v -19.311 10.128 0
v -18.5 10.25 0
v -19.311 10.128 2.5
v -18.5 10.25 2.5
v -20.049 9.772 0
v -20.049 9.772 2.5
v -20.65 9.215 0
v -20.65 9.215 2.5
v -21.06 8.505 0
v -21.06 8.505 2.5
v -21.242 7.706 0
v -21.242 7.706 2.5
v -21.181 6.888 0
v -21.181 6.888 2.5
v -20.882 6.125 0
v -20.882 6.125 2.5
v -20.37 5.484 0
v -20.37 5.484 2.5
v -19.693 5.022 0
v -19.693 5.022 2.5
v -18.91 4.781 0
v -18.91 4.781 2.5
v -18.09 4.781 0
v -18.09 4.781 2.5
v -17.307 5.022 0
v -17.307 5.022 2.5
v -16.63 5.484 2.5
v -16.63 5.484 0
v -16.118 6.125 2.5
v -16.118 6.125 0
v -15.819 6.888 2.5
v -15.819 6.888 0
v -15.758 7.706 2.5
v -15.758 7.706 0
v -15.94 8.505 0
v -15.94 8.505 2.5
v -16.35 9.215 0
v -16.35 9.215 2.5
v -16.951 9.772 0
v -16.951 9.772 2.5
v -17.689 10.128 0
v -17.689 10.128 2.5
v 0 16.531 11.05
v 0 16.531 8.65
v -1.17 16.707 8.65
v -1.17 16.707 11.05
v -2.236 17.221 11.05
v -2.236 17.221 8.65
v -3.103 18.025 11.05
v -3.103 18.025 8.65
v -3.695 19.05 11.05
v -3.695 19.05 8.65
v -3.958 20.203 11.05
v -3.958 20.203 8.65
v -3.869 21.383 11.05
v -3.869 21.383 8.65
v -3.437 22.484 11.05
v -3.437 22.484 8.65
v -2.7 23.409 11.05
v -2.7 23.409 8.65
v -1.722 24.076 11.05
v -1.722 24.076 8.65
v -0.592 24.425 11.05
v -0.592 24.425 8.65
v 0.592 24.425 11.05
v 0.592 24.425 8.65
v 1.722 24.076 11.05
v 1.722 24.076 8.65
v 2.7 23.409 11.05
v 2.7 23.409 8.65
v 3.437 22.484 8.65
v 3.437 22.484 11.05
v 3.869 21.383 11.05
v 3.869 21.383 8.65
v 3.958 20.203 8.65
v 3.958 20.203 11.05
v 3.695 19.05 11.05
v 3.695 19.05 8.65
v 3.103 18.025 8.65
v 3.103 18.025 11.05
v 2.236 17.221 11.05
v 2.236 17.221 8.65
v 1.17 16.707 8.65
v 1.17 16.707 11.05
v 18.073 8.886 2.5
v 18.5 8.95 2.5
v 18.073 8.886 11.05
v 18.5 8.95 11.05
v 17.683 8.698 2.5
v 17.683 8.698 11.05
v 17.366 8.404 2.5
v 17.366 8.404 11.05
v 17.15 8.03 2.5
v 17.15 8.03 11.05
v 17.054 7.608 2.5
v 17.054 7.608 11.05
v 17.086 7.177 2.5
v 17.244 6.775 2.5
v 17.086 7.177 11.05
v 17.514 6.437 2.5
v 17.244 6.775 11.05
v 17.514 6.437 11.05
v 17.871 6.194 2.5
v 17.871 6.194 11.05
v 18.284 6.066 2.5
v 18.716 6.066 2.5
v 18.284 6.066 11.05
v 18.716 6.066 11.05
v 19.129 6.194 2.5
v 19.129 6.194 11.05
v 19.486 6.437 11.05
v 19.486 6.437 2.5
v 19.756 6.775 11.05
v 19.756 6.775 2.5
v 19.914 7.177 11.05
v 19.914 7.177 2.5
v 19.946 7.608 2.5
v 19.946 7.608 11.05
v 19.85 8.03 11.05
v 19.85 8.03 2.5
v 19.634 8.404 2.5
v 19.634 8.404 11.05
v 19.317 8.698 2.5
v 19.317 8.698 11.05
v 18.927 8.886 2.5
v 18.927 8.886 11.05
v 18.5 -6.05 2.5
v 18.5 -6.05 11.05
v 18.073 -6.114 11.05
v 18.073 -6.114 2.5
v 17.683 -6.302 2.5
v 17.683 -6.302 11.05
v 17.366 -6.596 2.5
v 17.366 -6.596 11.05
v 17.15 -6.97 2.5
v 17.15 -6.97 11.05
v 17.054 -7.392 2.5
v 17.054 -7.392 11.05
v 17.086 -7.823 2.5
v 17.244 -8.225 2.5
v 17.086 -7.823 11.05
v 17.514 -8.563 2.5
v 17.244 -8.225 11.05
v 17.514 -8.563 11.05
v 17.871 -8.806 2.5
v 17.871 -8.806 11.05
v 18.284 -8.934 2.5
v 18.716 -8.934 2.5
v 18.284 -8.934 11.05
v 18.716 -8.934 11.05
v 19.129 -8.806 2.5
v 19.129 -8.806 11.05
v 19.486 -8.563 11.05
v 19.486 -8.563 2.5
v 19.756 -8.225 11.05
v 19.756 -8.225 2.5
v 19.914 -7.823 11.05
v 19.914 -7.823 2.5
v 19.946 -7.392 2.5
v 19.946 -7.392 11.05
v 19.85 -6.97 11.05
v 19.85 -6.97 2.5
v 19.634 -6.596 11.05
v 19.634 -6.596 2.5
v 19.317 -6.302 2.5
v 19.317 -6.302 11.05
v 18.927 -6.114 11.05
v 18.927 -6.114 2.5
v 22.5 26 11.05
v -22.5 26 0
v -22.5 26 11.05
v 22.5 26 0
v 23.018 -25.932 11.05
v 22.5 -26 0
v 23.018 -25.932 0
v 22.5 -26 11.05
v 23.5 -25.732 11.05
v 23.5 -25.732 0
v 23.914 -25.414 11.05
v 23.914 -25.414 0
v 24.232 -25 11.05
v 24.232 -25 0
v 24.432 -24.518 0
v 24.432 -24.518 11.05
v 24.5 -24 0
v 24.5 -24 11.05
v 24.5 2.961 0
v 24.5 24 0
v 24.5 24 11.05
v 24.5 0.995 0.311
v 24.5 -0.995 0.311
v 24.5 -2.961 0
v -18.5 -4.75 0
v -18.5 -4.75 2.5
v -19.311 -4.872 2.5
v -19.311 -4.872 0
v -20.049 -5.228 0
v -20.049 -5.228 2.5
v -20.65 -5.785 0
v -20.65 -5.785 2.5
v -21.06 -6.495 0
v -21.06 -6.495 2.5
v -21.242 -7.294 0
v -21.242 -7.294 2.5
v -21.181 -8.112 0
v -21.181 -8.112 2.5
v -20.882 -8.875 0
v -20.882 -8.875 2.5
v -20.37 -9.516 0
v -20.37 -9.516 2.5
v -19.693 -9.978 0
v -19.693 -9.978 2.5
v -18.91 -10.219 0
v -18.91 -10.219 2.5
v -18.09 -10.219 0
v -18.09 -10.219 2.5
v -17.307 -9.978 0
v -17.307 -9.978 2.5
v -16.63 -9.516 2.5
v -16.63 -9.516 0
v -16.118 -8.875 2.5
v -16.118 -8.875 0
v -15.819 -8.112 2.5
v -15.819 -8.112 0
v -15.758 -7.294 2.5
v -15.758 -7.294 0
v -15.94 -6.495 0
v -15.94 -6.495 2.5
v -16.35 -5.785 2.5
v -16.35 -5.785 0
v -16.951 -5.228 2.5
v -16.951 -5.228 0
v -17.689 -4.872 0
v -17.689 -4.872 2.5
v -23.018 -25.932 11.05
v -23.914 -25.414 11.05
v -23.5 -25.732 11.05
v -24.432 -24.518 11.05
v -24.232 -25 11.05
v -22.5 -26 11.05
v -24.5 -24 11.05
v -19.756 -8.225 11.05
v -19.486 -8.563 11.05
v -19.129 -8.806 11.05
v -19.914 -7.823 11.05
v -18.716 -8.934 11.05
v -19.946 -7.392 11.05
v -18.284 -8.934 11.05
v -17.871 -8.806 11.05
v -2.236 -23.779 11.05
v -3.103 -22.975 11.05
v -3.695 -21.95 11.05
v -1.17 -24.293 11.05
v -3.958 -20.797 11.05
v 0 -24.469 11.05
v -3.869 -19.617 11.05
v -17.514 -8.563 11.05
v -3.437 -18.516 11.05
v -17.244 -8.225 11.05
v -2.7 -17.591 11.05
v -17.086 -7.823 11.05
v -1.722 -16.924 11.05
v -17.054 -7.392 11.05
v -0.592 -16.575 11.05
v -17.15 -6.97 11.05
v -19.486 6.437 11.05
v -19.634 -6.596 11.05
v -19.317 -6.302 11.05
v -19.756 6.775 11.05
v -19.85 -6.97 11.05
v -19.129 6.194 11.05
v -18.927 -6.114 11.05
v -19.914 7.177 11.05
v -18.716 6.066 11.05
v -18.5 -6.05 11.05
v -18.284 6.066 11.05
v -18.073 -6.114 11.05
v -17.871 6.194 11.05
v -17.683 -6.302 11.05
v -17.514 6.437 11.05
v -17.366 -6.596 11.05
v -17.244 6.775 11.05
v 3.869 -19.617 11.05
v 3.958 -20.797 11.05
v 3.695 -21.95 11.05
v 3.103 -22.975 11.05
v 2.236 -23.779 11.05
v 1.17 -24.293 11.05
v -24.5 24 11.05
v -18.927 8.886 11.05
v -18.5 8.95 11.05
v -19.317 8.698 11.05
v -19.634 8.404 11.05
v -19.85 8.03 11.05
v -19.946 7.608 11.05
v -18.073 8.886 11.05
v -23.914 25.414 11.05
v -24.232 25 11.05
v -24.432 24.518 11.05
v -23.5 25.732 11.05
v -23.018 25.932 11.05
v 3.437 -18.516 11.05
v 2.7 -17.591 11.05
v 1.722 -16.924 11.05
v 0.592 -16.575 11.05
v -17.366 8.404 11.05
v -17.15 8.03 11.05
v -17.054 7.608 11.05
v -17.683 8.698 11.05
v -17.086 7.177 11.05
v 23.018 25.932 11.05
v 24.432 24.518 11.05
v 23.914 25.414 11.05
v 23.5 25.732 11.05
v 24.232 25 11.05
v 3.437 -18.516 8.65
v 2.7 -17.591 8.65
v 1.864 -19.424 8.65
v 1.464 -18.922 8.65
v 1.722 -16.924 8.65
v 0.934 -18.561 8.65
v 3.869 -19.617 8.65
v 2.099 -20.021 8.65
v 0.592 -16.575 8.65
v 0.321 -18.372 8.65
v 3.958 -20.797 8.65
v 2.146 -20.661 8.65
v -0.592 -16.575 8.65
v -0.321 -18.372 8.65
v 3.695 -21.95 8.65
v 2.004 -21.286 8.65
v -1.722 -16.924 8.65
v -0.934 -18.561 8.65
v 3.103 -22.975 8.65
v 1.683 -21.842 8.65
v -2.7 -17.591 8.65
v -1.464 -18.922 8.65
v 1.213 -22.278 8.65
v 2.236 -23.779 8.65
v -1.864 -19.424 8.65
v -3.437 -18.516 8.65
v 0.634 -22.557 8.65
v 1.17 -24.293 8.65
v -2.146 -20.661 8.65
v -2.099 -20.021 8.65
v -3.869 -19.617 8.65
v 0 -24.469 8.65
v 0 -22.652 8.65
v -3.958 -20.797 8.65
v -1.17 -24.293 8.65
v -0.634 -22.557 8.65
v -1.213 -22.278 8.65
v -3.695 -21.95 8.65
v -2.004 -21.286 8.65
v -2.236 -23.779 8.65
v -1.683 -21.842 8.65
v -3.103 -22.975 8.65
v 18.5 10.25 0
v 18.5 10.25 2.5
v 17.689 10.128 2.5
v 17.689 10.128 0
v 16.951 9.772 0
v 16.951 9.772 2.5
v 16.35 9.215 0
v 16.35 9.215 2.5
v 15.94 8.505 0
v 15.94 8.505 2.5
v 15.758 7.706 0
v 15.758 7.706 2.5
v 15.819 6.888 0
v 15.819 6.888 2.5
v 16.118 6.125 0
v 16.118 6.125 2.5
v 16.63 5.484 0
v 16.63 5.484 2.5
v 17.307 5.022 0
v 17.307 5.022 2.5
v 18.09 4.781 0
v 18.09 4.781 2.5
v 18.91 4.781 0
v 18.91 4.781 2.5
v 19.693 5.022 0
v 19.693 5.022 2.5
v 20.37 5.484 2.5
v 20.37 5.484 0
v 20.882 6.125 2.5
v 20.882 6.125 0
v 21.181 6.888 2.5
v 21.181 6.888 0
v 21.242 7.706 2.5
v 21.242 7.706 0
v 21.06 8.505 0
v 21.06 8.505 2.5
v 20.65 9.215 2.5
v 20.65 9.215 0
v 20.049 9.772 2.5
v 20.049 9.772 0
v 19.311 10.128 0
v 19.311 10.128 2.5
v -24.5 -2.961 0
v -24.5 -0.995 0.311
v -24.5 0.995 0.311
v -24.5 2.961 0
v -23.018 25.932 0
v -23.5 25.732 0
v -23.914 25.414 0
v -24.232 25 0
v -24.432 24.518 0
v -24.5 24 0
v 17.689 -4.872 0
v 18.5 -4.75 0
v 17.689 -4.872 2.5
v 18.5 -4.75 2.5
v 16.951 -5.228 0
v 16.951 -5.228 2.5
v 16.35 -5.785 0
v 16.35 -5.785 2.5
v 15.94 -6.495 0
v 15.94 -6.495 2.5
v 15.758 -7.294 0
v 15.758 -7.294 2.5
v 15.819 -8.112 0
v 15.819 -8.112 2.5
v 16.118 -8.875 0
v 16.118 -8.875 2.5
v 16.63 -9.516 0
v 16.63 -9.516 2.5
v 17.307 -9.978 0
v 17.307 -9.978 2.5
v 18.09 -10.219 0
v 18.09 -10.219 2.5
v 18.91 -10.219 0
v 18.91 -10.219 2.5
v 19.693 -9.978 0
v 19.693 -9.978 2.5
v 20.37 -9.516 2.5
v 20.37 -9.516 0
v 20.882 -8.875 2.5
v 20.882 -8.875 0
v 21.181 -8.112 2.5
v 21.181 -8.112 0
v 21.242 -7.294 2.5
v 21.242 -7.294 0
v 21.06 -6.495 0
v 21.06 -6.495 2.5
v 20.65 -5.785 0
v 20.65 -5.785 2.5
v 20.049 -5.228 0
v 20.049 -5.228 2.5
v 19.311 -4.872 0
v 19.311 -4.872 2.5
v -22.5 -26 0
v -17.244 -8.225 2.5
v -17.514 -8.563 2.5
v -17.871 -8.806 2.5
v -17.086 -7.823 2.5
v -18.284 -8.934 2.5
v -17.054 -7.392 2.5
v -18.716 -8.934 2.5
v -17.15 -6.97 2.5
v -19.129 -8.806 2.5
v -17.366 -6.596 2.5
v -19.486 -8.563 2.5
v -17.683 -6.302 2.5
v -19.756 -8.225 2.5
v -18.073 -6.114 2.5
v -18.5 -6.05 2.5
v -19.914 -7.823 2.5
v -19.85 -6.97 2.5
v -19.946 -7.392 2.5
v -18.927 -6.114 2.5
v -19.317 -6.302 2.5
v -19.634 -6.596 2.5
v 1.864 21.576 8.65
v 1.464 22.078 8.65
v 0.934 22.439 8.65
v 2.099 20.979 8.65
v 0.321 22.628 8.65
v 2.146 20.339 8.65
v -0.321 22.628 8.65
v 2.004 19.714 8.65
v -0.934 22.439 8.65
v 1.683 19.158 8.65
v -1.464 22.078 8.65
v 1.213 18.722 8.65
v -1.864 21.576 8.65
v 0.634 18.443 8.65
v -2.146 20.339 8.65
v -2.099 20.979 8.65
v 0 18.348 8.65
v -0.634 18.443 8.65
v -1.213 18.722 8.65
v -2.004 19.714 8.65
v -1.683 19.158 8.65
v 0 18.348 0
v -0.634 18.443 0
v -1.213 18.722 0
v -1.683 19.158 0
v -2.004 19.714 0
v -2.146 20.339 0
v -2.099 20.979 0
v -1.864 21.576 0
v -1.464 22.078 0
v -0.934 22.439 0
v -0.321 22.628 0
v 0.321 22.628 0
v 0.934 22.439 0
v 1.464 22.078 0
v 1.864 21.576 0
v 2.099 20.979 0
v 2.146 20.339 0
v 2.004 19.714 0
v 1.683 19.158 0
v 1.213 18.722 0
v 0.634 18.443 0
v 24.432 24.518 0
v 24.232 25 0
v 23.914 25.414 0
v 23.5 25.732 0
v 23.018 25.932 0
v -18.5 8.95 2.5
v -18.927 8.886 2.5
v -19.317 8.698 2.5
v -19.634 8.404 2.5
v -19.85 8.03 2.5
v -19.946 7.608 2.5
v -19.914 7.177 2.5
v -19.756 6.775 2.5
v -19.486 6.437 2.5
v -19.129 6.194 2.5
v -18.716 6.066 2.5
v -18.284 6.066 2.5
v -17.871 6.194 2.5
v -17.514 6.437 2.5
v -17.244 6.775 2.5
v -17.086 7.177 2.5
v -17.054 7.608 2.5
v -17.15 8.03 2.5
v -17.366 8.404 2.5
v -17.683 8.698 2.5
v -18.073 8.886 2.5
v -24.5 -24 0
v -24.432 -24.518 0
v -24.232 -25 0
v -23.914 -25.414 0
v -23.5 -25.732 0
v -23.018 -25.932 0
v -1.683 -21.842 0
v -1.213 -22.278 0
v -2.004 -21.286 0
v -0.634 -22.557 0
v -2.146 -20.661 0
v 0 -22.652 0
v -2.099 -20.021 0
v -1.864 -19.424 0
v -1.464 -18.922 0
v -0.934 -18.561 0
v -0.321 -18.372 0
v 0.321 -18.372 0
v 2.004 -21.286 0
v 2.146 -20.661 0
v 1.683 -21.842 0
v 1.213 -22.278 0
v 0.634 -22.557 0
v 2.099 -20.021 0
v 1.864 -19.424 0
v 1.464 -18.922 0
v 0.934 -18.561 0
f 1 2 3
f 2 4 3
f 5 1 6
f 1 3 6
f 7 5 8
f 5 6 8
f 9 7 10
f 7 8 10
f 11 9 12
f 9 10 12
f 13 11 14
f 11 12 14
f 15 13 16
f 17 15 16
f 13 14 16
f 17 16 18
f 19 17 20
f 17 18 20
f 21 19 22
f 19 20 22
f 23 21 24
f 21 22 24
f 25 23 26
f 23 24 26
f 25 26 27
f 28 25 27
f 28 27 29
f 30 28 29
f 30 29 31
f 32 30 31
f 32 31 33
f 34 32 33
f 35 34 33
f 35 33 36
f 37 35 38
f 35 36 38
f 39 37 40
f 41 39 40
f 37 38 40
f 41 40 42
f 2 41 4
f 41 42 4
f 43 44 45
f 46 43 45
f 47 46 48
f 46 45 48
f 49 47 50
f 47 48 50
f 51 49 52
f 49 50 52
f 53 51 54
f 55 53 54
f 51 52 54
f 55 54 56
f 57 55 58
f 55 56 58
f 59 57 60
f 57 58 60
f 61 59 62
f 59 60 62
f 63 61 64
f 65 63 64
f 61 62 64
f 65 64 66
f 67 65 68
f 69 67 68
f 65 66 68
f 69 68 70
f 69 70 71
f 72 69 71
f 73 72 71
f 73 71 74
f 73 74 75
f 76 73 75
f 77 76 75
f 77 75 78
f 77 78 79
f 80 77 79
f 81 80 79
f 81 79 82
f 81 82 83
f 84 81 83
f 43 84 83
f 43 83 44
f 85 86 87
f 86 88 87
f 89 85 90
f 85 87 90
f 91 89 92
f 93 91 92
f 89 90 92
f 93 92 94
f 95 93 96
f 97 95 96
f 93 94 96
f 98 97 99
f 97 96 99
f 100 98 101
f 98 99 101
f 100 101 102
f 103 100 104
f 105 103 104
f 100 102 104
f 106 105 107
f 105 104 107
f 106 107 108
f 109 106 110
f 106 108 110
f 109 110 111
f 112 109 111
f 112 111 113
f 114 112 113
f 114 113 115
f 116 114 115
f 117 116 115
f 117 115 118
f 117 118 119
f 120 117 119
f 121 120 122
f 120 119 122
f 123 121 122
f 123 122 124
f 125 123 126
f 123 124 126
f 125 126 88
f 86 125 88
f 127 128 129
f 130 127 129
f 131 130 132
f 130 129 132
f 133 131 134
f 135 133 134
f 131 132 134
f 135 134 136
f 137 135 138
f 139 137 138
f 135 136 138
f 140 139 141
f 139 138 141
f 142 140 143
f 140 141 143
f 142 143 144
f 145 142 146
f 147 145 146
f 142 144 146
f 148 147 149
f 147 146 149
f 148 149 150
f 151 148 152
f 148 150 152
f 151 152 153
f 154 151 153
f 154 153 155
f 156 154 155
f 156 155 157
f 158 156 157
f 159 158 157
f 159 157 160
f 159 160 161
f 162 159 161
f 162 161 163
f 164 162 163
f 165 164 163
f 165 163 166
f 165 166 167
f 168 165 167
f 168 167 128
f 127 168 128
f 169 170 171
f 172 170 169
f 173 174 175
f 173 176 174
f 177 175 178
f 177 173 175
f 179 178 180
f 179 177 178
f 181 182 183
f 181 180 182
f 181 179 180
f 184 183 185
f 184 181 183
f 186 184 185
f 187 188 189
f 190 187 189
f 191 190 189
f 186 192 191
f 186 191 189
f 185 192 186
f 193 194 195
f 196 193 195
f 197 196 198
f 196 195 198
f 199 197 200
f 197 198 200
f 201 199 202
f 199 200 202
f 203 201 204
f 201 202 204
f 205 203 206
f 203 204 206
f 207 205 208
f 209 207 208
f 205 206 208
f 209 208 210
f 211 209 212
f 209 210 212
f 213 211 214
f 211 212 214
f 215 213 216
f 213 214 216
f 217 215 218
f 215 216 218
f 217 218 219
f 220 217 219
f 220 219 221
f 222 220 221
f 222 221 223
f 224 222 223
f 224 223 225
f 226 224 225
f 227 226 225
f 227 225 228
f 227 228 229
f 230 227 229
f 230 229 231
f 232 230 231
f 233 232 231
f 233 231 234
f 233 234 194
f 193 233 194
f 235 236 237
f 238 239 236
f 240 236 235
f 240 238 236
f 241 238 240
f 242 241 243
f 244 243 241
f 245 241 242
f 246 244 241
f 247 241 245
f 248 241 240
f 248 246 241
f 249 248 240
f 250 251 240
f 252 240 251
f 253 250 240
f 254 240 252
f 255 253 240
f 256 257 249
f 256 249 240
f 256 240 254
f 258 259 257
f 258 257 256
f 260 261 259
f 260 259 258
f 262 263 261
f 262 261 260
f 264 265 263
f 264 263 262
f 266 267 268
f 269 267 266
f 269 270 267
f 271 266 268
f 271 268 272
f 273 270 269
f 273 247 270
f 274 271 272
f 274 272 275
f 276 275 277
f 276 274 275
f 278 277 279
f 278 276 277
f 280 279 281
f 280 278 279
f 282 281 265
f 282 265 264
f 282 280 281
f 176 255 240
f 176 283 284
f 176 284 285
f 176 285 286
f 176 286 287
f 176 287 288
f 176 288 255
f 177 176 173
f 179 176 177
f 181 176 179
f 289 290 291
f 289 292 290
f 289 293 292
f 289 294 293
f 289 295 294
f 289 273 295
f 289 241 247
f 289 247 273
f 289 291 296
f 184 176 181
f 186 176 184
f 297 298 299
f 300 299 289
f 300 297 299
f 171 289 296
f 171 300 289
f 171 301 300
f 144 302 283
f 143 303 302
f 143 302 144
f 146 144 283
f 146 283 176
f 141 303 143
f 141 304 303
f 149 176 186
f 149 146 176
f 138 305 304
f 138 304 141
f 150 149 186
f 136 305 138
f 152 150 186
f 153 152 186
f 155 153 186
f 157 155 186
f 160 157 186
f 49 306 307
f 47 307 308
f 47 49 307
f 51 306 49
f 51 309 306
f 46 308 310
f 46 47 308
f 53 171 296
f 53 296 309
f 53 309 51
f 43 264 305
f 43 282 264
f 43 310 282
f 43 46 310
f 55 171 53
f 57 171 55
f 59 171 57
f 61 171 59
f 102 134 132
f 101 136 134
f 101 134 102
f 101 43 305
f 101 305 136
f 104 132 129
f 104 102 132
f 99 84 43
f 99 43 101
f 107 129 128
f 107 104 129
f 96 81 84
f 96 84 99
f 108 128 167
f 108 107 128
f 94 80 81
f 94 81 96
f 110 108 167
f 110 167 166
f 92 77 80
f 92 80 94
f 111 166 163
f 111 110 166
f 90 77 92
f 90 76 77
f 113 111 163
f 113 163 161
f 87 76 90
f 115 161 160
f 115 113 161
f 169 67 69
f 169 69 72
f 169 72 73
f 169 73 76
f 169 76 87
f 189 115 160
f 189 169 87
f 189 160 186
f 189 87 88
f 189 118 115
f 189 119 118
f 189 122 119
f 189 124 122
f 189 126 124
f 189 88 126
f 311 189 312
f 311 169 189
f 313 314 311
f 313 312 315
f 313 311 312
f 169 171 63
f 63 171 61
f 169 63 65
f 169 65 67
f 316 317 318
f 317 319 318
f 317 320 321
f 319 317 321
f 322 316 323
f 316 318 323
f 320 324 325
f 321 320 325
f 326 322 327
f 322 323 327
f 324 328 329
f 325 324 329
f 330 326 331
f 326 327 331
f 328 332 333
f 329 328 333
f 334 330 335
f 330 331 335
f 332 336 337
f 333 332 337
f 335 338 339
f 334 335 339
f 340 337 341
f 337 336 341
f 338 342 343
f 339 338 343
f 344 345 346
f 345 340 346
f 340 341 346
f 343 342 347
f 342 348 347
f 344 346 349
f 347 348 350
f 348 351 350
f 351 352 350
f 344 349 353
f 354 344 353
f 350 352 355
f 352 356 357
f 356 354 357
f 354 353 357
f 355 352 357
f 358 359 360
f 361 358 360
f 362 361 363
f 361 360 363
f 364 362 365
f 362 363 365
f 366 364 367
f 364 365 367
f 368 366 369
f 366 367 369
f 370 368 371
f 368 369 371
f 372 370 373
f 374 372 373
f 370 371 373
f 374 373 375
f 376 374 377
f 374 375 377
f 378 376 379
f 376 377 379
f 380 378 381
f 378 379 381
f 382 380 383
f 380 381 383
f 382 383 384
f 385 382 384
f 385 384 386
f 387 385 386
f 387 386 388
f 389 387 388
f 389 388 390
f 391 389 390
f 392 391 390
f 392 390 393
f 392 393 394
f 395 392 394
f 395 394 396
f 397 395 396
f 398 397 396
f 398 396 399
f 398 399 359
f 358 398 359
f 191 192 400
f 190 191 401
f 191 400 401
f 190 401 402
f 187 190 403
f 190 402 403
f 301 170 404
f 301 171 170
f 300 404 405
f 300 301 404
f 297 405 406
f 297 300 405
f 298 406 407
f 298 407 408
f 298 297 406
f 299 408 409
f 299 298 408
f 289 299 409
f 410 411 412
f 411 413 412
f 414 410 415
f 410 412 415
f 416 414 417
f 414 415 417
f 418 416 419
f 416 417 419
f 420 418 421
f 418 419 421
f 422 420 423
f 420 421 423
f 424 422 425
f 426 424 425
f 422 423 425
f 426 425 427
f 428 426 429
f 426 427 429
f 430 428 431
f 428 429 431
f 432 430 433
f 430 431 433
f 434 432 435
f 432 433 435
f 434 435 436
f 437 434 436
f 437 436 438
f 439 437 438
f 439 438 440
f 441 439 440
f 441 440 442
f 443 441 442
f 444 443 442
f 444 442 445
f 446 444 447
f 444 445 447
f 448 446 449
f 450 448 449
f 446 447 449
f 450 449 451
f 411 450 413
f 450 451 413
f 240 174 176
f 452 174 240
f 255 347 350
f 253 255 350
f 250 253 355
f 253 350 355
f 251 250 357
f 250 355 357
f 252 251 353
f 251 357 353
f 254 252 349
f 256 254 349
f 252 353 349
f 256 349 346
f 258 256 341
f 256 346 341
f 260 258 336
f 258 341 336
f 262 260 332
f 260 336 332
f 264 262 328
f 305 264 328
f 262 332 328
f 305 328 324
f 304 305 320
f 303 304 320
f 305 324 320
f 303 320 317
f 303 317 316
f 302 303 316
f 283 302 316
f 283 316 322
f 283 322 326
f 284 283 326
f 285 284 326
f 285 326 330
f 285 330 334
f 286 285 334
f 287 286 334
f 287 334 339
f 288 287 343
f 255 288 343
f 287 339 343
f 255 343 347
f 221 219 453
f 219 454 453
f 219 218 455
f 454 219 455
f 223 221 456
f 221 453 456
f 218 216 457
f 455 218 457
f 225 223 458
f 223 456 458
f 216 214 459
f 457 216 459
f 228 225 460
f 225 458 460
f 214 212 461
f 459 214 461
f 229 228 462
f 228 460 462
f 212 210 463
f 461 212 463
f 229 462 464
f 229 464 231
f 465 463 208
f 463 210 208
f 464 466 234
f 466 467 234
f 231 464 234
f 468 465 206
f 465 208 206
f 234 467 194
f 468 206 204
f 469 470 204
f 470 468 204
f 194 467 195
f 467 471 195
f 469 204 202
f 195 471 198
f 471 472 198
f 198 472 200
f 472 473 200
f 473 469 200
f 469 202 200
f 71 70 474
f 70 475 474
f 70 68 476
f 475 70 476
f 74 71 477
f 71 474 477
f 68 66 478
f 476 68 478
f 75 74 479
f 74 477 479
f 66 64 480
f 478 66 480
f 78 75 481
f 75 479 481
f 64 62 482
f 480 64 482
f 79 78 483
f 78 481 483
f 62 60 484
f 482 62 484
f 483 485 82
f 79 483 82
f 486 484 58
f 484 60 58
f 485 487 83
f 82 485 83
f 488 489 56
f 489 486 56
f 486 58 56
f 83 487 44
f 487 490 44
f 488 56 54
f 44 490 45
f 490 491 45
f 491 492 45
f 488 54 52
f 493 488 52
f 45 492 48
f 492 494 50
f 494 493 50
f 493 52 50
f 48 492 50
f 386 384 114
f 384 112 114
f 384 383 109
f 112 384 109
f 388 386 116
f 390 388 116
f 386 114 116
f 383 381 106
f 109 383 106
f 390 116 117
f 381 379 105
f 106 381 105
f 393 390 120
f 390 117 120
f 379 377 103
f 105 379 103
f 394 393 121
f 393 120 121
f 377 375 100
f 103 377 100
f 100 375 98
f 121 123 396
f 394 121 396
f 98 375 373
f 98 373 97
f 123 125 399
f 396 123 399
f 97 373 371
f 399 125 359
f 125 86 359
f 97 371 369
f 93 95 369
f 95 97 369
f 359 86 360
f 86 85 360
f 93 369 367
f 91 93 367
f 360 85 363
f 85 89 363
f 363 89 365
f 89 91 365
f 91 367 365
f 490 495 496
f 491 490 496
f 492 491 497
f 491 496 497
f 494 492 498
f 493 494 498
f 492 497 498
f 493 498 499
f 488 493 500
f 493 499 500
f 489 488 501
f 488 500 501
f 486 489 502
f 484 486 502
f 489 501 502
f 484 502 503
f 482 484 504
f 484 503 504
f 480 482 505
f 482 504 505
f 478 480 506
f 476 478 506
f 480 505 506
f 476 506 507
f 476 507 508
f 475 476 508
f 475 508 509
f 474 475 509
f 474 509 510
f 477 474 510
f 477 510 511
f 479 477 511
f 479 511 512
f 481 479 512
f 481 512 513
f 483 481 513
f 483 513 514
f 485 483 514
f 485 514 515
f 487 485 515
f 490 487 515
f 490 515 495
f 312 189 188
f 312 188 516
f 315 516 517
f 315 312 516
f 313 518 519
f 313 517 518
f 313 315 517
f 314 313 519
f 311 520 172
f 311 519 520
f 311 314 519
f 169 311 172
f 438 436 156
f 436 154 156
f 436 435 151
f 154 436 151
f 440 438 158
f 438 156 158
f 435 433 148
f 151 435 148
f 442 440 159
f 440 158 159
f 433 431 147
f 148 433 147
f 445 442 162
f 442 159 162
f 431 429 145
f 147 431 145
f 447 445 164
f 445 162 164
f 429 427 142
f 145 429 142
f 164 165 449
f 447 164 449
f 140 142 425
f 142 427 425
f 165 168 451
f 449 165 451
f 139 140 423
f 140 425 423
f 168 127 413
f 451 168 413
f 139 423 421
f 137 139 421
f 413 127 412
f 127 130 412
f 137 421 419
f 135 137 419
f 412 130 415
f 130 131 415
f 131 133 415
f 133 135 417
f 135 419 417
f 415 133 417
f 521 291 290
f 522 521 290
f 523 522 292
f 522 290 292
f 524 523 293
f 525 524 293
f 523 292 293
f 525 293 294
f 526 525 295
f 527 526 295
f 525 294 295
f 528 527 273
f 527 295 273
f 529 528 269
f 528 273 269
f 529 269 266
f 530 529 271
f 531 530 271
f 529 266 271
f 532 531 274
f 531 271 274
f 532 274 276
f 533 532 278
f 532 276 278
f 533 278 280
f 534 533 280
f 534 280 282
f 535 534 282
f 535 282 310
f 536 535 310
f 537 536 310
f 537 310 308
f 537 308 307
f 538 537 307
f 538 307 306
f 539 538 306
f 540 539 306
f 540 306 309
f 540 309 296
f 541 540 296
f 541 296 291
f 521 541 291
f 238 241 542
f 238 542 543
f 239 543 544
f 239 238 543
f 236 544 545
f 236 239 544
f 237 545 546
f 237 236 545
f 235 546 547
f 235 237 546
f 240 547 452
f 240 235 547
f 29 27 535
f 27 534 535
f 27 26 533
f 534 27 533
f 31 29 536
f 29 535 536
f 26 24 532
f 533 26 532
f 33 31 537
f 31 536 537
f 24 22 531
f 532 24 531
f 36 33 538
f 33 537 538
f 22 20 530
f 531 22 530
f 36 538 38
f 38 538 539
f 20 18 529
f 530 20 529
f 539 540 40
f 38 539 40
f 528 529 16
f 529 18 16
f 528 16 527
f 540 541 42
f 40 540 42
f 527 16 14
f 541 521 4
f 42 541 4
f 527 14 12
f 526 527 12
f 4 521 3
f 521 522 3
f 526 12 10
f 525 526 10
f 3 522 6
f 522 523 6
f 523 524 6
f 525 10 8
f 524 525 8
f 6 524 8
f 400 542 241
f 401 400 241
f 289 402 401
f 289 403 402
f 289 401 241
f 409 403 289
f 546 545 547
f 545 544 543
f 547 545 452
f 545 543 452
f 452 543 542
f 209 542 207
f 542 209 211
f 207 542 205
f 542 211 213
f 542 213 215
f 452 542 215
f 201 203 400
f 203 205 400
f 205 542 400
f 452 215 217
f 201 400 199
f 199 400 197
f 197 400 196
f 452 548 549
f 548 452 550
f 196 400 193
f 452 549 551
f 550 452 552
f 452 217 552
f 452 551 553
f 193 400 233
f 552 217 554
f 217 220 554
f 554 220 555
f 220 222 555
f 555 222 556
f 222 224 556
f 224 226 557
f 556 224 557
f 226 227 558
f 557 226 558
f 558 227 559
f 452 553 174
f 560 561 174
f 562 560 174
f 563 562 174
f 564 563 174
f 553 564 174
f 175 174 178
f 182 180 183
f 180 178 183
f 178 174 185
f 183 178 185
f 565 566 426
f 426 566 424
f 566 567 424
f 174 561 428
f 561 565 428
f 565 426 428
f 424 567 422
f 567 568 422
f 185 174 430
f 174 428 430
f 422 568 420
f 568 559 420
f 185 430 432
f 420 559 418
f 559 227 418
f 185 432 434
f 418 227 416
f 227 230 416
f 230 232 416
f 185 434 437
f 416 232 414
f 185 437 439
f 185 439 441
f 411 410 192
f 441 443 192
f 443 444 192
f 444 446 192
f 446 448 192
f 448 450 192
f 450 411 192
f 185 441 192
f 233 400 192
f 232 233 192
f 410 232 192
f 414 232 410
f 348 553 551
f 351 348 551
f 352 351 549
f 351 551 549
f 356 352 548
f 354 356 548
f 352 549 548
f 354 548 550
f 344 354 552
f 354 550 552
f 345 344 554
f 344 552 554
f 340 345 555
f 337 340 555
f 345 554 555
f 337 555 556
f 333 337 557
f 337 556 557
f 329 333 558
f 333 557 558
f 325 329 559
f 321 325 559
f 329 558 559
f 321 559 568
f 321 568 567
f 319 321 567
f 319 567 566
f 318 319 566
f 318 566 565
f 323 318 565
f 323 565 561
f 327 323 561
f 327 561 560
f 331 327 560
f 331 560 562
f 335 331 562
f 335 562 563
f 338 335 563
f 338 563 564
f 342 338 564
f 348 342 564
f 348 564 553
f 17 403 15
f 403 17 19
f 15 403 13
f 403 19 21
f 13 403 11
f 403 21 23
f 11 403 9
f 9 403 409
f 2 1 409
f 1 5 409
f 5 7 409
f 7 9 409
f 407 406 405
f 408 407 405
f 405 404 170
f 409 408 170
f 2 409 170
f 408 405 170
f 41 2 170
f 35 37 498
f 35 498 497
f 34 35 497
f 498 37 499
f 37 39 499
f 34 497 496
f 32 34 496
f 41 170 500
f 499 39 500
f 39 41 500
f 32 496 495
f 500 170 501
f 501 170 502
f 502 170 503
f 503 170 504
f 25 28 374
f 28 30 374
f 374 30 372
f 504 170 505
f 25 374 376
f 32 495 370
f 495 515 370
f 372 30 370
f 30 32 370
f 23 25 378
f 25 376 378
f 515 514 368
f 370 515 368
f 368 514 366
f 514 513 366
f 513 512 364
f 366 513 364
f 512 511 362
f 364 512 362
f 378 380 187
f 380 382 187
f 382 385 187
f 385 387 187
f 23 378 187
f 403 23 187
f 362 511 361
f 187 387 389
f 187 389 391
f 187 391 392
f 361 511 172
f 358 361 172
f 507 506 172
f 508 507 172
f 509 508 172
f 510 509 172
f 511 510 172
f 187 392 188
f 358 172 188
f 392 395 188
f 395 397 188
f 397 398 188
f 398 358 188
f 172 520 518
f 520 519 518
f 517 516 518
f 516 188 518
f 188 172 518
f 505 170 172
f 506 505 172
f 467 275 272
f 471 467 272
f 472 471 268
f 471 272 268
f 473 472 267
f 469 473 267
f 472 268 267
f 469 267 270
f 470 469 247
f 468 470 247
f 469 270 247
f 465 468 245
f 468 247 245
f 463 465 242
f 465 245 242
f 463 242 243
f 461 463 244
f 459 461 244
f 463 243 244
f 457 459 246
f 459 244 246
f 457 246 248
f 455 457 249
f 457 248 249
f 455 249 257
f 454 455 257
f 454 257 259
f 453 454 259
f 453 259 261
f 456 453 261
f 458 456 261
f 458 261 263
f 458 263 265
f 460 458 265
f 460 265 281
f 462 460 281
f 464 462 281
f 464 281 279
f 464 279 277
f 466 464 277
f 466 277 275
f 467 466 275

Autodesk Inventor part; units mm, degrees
ref_plane "YZ Plane" through (0, 0, 0) normal (1, 0, 0) x (0, 1, 0)
ref_plane "XZ Plane" through (0, 0, 0) normal (0, 1, 0) x (-1, 0, 0)
ref_plane "XY Plane" through (0, 0, 0) normal (0, 0, 1) x (1, 0, 0)
sketch "Sketch1" plane through (0, 0, 0) normal (0, 0, 1) x (1, 0, 0)
  line L0 (-24.5, 26) -> (24.5, 26)
  line L1 (24.5, 26) -> (24.5, -26)
  line L2 (24.5, -26) -> (-24.5, -26)
  line L3 (-24.5, -26) -> (-24.5, 26)
  point P0 (0, 0)
  dimension "d0" = 52
  dimension "d1" = 26
  dimension "d2" = 49
  dimension "d3" = 24.5
extrude "Extrusion1" add sketch "Sketch1" along normal blind 11.05
sketch "Sketch3" plane through (0, 0, 11.05) normal (0, 0, 1) x (1, 0, 0)
  line L0 (-24.5, -26) -> (24.5, -26) projected
  line L1 (0, -26) -> (0, -20.5)
  line L2 (24.5, 26) -> (-24.5, 26) projected
  line L3 (0, 26) -> (0, 20.5)
  point P0 (0, 0)
  point P1 (0, 0)
  dimension "d13" = 5.5
  dimension "d14" = 20.5
  dimension "d15" = 5.5
  dimension "d16" = 20.5
hole "Hole1" at (0, 20.5, 11.05) at (0, -20.5, 11.05) direction (0, 0, -1) diameter 4.305 depth 12.3 counterbore diameter 7.938 counterbore depth 2.4 clearance for "Socket Head Cap Screw" size "#8" standard "Ansi Unified Screw Threads"
fillet "Fillet1" radius 2 4 edges at (-24.5, -26, 5.525) (-24.5, 26, 5.525) (24.5, -26, 5.525) (24.5, 26, 5.525)
sketch "Sketch7" plane through (-24.5, -24, 0) normal (-1, 0, 0) x (0, 0, 1)
  circle A0 centre (-12.35, 24) radius 12.7
  point P0 (0, 24)
  dimension "d57" = 25.4
  dimension "d58" = 12.35
extrude "Extrusion3" cut sketch "Sketch7" against normal blind 50
sketch "Sketch11" plane through (0, 0, 11.05) normal (0, 0, 1) x (1, 0, 0)
  line L0 (0, 0) -> (0, -15) construction
  line L1 (0, 0) -> (0, 15) construction
  line L2 (0, 0) -> (22.5, 0) construction
  line L3 (22.5, 0) -> (22.5, -15) construction
  line L4 (22.5, 0) -> (22.5, 15) construction
  line L5 (0, 0) -> (-22.5, 0) construction
  line L6 (-22.5, 0) -> (-22.5, -15) construction
  line L7 (-22.5, 0) -> (-22.5, 15) construction
  line L8 (22.5, -15) -> (-22.5, -15) construction
  line L9 (22.5, 15) -> (-22.5, 15) construction
  line L10 (-15.4375, 7.9375) -> (15.4375, 7.9375) construction
  line L11 (15.4375, -7.9375) -> (-15.4375, -7.9375) construction
  line L12 (-18.6125, -11.1125) -> (-18.6125, 0) construction
  line L13 (-18.6125, 0) -> (-18.6125, 11.1125) construction
  line L14 (18.6125, 11.1125) -> (18.6125, 0) construction
  line L15 (18.6125, 0) -> (18.6125, -11.1125) construction
  line L16 (15.4375, -7.9375) -> (18.6125, -7.9375) construction
  line L17 (15.4375, 7.9375) -> (18.6125, 7.9375) construction
  line L18 (-15.4375, -7.9375) -> (-18.6125, -7.9375) construction
  line L19 (-15.4375, 7.9375) -> (-18.6125, 7.9375) construction
  line L20 (18.6125, -7.9375) -> (29.1538, -7.9375) construction
  line L21 (18.6125, 7.9375) -> (28.0959, 7.9375) construction
  line L22 (-18.6125, -7.9375) -> (-33.3375, -7.9375) construction
  line L23 (-18.6125, 7.9375) -> (-34.925, 7.9375) construction
  dimension "d98" = 22.5
  dimension "d99" = 15
  dimension "d100" = 15
  dimension "d101" = 22.5
  dimension "d102" = 15
  dimension "d103" = 15
  dimension "d104" = 7.0625
hole "Hole6" [suppressed]
sketch "Sketch12" plane through (0, 0, 0) normal (0, 0, -1) x (-1, 0, 0)
  line L0 (-22.5, 0) -> (-22.5, 15) construction
  line L1 (22.5, 0) -> (22.5, 15) construction
  line L2 (-22.5, 0) -> (-22.5, -15) construction
  line L3 (22.5, 0) -> (22.5, -15) construction
  line L4 (24.5, 24) -> (24.5, -24) construction
  line L5 (-22.5, 15) -> (22.5, 15) construction
  line L6 (-22.5, -15) -> (22.5, -15) construction
  line L7 (-18.5, 11.55) -> (-18.5, 0) construction
  line L8 (-18.5, 0) -> (-18.5, -11.55) construction
  line L9 (18.5, -11.55) -> (18.5, 0) construction
  line L10 (18.5, 0) -> (18.5, 11.55) construction
  line L11 (15.9875, -7.5) -> (-14.8875, -7.5) construction
  line L12 (-15.4375, 7.5) -> (15.4375, 7.5) construction
  line L13 (-15.4375, 7.5) -> (-18.5, 7.5) construction
  line L14 (15.4375, 7.5) -> (18.5, 7.5) construction
  line L15 (-14.8875, -7.5) -> (-18.5, -7.5) construction
  line L16 (15.9875, -7.5) -> (18.5, -7.5) construction
  line L17 (-18.5, 7.5) -> (-21.7329, 7.5) construction
  line L18 (-18.5, -7.5) -> (-20.6685, -7.5) construction
  line L19 (18.5, -7.5) -> (22.1748, -7.5) construction
  line L20 (18.5, 7.5) -> (20.6375, 7.5) construction
  point P0 (0, 0)
  dimension "d115" = 15
  dimension "d117" = 4
  dimension "d118" = 7.5
  dimension "d126" = 45
  dimension "d127" = 15
  dimension "d128" = 4
  dimension "d129" = 7.5
hole "Hole7" at (18.5, 7.5, 0) at (-18.5, 7.5, 0) at (18.5, -7.5, 0) at (-18.5, -7.5, 0) direction (0, 0, 1) diameter 2.9 end through all counterbore diameter 5.5 counterbore depth 2.5 clearance for "Socket Head Cap Screw" size "M2.5" standard "Ansi Metric M Profile"
equation "\"d1\" = 0.5 * d0"
equation "\"d3\" = 0.5 * d2"
equation "\"d15\" = d13"
properties part number "ADAPTER_EOM2.1GHz_new"
